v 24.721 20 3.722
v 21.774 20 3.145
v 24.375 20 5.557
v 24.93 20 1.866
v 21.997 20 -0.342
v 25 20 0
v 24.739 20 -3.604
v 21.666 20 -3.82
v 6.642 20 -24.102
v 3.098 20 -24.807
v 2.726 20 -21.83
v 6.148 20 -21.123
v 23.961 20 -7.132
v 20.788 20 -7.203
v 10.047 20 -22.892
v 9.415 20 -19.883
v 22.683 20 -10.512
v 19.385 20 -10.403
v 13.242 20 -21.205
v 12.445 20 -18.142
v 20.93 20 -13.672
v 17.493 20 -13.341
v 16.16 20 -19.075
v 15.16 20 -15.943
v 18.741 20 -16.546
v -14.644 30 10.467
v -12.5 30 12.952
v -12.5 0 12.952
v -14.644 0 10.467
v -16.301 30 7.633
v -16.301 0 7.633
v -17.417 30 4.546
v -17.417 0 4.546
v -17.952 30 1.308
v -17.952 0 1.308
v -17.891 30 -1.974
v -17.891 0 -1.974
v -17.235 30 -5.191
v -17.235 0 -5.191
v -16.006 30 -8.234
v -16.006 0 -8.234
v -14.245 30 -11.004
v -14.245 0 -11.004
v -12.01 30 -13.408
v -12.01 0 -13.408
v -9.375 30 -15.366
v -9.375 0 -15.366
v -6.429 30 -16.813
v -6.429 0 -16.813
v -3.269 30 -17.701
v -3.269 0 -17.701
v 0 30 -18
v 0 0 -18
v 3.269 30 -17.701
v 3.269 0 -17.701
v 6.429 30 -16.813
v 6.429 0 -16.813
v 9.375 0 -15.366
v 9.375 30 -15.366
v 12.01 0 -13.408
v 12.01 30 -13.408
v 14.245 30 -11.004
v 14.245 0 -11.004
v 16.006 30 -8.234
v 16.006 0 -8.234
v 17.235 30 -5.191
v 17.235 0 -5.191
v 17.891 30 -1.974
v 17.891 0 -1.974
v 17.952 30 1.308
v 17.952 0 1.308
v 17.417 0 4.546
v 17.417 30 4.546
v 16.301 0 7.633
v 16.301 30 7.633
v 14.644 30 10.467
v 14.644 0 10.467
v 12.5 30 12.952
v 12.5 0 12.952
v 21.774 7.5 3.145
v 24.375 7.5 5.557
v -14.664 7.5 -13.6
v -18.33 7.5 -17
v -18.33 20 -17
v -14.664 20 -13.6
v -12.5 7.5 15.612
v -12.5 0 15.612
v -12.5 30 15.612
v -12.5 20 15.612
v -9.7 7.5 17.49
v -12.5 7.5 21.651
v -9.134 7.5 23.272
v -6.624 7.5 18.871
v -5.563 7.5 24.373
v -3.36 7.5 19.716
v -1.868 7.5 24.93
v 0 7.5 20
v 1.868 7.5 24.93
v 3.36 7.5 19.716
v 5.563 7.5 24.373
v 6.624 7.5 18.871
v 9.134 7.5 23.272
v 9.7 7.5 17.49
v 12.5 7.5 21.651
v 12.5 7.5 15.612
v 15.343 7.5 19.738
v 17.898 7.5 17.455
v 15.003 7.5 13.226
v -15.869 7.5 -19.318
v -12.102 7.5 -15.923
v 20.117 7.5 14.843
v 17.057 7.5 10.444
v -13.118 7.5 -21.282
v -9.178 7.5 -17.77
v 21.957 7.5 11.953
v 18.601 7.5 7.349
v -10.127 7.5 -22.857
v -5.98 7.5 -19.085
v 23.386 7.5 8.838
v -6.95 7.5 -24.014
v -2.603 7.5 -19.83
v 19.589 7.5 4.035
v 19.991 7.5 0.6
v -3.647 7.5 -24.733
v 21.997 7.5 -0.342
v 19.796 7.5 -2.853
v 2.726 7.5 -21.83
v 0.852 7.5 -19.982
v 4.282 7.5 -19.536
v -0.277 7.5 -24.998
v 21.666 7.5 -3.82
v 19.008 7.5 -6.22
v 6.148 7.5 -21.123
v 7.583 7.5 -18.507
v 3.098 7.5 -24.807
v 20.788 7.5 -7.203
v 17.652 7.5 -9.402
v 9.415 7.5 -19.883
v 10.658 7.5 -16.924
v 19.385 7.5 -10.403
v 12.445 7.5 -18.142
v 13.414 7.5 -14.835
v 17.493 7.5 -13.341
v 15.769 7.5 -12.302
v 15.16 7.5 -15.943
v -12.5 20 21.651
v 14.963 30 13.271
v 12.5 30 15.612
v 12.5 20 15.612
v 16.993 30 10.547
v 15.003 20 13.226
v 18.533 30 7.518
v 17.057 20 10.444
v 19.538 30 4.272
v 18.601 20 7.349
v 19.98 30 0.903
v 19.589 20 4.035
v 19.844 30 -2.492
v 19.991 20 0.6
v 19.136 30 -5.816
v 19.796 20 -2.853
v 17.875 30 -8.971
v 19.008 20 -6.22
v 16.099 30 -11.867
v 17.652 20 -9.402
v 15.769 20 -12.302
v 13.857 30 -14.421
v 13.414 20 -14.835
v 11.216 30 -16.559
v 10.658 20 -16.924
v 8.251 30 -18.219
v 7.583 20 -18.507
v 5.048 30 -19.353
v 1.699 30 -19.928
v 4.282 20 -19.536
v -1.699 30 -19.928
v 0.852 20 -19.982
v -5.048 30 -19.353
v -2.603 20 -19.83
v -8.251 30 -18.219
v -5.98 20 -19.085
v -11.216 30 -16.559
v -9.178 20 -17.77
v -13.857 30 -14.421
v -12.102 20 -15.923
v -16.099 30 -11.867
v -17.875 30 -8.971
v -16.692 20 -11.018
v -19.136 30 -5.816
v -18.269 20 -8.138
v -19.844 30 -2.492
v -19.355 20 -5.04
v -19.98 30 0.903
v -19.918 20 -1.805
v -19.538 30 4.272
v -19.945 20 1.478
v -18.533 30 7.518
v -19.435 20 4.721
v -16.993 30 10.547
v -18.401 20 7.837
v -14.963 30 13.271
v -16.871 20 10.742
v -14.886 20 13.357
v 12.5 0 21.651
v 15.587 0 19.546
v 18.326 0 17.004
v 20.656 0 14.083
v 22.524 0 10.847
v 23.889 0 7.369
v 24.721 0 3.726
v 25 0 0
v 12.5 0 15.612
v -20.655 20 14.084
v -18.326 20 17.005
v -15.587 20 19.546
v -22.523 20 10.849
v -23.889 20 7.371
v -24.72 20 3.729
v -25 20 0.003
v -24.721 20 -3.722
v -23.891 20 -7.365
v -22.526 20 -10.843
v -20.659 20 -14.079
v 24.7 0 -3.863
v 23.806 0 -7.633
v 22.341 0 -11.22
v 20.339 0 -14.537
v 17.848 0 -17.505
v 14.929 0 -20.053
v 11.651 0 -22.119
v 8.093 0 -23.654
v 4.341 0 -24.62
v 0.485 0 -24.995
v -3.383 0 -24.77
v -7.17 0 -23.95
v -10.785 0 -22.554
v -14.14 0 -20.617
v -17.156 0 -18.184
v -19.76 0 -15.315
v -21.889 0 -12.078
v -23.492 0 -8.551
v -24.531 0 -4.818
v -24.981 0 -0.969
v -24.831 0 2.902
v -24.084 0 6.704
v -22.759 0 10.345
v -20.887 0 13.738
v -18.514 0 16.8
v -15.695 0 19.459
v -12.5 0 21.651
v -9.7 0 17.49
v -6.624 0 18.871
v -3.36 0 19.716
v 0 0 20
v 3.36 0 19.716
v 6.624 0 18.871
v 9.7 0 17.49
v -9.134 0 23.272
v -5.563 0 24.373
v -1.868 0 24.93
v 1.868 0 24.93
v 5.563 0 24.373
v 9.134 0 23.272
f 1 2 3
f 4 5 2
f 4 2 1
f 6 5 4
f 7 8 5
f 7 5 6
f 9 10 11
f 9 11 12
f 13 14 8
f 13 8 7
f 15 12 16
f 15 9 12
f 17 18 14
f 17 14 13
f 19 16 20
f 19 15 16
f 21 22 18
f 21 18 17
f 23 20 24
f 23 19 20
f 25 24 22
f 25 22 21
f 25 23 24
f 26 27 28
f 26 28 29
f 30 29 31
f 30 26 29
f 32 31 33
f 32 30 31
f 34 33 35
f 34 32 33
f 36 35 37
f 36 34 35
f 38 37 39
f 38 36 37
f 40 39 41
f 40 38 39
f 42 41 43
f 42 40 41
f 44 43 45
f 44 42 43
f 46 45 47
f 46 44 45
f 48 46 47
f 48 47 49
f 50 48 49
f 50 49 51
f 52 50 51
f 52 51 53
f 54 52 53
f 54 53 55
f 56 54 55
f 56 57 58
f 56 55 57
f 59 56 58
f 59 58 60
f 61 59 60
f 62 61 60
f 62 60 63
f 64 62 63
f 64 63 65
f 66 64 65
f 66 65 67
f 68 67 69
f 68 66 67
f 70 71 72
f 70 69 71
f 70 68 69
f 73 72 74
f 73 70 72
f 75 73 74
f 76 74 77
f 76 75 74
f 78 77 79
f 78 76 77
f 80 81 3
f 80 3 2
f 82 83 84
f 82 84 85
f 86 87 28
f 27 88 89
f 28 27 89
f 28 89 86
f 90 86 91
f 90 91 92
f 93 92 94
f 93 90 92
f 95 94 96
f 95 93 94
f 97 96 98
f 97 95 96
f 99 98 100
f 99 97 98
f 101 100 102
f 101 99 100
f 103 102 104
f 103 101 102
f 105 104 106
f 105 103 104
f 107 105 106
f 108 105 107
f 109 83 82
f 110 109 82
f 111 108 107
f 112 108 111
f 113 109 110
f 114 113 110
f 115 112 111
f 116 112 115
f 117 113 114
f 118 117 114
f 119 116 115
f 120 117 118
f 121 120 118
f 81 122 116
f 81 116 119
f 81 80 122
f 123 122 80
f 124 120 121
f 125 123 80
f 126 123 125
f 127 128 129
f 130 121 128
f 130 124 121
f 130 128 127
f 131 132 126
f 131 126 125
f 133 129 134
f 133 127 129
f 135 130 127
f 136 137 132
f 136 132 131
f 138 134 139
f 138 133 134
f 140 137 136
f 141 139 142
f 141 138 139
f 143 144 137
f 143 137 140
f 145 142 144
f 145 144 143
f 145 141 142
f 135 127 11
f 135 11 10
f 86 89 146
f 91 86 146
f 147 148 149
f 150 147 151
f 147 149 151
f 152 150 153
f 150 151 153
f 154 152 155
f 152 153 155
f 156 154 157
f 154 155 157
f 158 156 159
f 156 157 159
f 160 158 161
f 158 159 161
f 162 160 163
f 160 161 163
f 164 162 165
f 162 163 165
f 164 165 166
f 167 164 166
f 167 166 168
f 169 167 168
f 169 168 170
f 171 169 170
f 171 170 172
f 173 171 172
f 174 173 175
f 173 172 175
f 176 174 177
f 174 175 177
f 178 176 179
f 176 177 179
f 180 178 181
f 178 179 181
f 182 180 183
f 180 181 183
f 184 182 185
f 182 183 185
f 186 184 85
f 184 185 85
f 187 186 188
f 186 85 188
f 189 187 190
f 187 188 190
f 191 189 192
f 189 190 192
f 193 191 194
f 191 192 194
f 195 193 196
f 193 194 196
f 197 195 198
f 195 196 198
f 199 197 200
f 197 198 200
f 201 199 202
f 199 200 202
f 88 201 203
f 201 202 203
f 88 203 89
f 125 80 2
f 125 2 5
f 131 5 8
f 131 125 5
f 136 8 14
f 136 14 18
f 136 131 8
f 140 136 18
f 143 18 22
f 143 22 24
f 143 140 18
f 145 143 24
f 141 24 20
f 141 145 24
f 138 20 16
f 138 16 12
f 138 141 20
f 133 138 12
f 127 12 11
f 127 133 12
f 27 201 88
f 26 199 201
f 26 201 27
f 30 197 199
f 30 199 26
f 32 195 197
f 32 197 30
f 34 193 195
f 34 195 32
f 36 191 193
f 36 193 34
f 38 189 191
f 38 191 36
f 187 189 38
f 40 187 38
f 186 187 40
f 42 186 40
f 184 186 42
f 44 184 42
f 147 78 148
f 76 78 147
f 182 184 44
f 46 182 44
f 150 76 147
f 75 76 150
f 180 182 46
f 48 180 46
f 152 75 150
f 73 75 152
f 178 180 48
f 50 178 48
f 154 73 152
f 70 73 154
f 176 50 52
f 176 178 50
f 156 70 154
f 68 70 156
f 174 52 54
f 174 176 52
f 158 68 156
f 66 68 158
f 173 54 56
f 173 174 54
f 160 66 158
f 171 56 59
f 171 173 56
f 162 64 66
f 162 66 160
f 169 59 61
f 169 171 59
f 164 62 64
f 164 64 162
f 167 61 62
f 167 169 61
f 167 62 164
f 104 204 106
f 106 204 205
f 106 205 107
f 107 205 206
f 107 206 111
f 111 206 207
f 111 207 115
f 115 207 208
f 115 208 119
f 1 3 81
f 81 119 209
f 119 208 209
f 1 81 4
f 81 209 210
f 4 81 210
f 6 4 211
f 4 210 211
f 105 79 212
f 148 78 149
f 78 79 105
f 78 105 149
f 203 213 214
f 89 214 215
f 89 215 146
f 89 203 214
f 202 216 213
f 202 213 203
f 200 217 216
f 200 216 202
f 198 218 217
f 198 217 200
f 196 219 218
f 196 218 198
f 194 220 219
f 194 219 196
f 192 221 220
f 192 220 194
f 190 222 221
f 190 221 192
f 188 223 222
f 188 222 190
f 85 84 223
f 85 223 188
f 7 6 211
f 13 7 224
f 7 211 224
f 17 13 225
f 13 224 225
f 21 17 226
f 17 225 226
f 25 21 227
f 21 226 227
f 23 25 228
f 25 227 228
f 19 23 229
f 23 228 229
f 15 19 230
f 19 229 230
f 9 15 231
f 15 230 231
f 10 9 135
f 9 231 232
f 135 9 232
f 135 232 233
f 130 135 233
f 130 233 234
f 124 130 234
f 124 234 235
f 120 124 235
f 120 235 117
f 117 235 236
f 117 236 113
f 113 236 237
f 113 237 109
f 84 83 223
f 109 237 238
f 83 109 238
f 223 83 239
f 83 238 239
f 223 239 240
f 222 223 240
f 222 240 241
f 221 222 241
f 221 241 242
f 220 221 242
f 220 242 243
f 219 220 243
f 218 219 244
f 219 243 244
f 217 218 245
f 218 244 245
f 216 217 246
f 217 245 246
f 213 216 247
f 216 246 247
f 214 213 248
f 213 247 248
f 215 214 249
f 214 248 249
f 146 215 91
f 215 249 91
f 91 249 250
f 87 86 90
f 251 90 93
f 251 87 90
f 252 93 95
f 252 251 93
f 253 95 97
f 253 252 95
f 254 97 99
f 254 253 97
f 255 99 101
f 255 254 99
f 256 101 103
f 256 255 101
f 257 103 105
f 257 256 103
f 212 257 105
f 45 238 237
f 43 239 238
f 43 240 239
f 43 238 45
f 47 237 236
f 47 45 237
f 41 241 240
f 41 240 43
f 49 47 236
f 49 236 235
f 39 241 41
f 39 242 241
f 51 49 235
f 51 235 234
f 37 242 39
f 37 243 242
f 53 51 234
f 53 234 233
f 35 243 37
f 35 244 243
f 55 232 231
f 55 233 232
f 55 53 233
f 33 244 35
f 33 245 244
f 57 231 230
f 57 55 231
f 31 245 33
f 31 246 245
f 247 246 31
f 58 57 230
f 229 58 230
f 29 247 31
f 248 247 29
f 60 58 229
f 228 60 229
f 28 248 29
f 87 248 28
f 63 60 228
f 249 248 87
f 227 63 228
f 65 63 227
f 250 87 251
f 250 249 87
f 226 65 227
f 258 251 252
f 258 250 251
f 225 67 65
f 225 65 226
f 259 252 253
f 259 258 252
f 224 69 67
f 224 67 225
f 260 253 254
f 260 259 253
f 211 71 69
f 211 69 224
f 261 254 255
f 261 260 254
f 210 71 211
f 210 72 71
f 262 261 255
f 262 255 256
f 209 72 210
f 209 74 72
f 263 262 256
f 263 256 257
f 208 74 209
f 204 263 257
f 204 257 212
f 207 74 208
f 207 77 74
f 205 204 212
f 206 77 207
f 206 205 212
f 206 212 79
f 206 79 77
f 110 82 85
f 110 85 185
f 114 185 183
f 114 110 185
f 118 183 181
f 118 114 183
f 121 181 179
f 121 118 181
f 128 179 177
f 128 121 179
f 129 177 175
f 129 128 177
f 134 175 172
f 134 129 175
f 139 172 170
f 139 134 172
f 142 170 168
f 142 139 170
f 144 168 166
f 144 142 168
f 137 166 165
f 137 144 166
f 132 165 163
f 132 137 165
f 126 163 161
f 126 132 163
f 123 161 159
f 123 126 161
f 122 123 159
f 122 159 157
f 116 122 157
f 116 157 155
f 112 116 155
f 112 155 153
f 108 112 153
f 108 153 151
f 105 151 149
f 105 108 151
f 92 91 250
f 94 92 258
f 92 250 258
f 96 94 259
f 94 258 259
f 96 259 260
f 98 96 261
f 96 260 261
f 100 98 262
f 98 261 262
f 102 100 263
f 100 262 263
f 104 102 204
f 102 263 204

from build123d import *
from build123d.topology import SkipClean

# Parameters (mm, degrees)
ESBO_O1_R                            = 20
RESSALTO_EXTRUS_O2_DEPTH             = 20
RESSALTO_EXTRUS_O3_DEPTH             = 10
RESSALTO_EXTRUS_O3_DIRECTION_2_REACH = 42.62
CORTE_EXTRUS_O2_START                = -12.5
CORTE_EXTRUS_O2_DEPTH                = 12.5


with BuildPart() as part:
    # Esboço1 → Ressalto-extrusão2 (new body)
    with BuildSketch(Plane(origin=(0, 0, 0), x_dir=(1, 0, 0), z_dir=(0, 1, 0))):
        with BuildLine():
            ThreePointArc((-12.5, -21.650635095), (0, -25), (12.5, -21.650635095))
            ThreePointArc((12.5, -21.650635095), (21.650635095, -12.5), (25, 0))
            ThreePointArc((25, 0), (-12.5, 21.650635095), (-12.5, -21.650635095))
        make_face()
        with Locations(Location((0, 0, 0), (0, 0, 270))):
            Circle(ESBO_O1_R, mode=Mode.SUBTRACT)
    extrude(amount=RESSALTO_EXTRUS_O2_DEPTH)

    # Esboço2 → Ressalto-extrusão3 (add)
    with BuildSketch(Plane(origin=(0, 20, 0), x_dir=(1, 0, 0), z_dir=(0, 1, 0))):
        with BuildLine():
            Line((-12.5, -15.612494996), (-12.5, -12.951833847))
            ThreePointArc((-12.5, -12.951833847), (0, 18), (12.5, -12.951833847))
            Line((12.5, -12.951833847), (12.5, -15.612494996))
            ThreePointArc((12.5, -15.612494996), (0, 20), (-12.5, -15.612494996))
        make_face()
    extrude(amount=RESSALTO_EXTRUS_O3_DEPTH)

    # Ressalto-extrusão3 direction 2: up to this face of the body (flat: up to its plane)
    ressalto_extrus_o3_direction_2_end = Plane(part.part.faces().sort_by_distance((12.146446609, 0, -21.038262659))[0])
    # Esboço2 → Ressalto-extrusão3 direction 2 (add, up to the picked face)
    with BuildSketch(Plane(origin=(0, 20, 0), x_dir=(1, 0, 0), z_dir=(0, 1, 0)), mode=Mode.PRIVATE) as ressalto_extrus_o3_direction_2_sk1:
        with BuildLine():
            Line((-12.5, -15.612494996), (-12.5, -12.951833847))
            ThreePointArc((-12.5, -12.951833847), (0, 18), (12.5, -12.951833847))
            Line((12.5, -12.951833847), (12.5, -15.612494996))
            ThreePointArc((12.5, -15.612494996), (0, 20), (-12.5, -15.612494996))
        make_face()
    ressalto_extrus_o3_direction_2_tool1 = split(extrude(ressalto_extrus_o3_direction_2_sk1.sketch, amount=-RESSALTO_EXTRUS_O3_DIRECTION_2_REACH, mode=Mode.PRIVATE), bisect_by=ressalto_extrus_o3_direction_2_end, keep=Keep.BOTH, mode=Mode.PRIVATE)
    add(ressalto_extrus_o3_direction_2_tool1.solids().sort_by(Axis((13.03556, 20, 14.282164), (0, -1, 0)))[0])

    # Esboço3 → Corte-extrusão2 (cut)
    with SkipClean():  # the faces are left unmerged after this step: merging them gives an invalid solid
        with BuildSketch(Plane(origin=(0, 20, 0), x_dir=(1, 0, 0), z_dir=(0, 1, 0)).offset(CORTE_EXTRUS_O2_START)):
            with BuildLine():
                Line((-18.33030278, 17), (-14.664242224, 13.6))
                ThreePointArc((-14.664242224, 13.6), (19.945337297, 1.477673891), (-12.5, -15.612494996))
                Line((-12.5, -15.612494996), (-12.5, -21.650635095))
                ThreePointArc((-12.5, -21.650635095), (10, -22.912878475), (24.374507866, -5.557280474))
                Line((24.374507866, -5.557280474), (21.773974537, -3.145478163))
                ThreePointArc((21.773974537, -3.145478163), (17.493290141, 13.341094409), (2.726342097, 21.830415909))
                Line((2.726342097, 21.830415909), (3.098116019, 24.807290806))
                ThreePointArc((3.098116019, 24.807290806), (-8.558231465, 23.489501361), (-18.33030278, 17))
            make_face()
        extrude(amount=CORTE_EXTRUS_O2_DEPTH, mode=Mode.SUBTRACT)


solid = part.part
